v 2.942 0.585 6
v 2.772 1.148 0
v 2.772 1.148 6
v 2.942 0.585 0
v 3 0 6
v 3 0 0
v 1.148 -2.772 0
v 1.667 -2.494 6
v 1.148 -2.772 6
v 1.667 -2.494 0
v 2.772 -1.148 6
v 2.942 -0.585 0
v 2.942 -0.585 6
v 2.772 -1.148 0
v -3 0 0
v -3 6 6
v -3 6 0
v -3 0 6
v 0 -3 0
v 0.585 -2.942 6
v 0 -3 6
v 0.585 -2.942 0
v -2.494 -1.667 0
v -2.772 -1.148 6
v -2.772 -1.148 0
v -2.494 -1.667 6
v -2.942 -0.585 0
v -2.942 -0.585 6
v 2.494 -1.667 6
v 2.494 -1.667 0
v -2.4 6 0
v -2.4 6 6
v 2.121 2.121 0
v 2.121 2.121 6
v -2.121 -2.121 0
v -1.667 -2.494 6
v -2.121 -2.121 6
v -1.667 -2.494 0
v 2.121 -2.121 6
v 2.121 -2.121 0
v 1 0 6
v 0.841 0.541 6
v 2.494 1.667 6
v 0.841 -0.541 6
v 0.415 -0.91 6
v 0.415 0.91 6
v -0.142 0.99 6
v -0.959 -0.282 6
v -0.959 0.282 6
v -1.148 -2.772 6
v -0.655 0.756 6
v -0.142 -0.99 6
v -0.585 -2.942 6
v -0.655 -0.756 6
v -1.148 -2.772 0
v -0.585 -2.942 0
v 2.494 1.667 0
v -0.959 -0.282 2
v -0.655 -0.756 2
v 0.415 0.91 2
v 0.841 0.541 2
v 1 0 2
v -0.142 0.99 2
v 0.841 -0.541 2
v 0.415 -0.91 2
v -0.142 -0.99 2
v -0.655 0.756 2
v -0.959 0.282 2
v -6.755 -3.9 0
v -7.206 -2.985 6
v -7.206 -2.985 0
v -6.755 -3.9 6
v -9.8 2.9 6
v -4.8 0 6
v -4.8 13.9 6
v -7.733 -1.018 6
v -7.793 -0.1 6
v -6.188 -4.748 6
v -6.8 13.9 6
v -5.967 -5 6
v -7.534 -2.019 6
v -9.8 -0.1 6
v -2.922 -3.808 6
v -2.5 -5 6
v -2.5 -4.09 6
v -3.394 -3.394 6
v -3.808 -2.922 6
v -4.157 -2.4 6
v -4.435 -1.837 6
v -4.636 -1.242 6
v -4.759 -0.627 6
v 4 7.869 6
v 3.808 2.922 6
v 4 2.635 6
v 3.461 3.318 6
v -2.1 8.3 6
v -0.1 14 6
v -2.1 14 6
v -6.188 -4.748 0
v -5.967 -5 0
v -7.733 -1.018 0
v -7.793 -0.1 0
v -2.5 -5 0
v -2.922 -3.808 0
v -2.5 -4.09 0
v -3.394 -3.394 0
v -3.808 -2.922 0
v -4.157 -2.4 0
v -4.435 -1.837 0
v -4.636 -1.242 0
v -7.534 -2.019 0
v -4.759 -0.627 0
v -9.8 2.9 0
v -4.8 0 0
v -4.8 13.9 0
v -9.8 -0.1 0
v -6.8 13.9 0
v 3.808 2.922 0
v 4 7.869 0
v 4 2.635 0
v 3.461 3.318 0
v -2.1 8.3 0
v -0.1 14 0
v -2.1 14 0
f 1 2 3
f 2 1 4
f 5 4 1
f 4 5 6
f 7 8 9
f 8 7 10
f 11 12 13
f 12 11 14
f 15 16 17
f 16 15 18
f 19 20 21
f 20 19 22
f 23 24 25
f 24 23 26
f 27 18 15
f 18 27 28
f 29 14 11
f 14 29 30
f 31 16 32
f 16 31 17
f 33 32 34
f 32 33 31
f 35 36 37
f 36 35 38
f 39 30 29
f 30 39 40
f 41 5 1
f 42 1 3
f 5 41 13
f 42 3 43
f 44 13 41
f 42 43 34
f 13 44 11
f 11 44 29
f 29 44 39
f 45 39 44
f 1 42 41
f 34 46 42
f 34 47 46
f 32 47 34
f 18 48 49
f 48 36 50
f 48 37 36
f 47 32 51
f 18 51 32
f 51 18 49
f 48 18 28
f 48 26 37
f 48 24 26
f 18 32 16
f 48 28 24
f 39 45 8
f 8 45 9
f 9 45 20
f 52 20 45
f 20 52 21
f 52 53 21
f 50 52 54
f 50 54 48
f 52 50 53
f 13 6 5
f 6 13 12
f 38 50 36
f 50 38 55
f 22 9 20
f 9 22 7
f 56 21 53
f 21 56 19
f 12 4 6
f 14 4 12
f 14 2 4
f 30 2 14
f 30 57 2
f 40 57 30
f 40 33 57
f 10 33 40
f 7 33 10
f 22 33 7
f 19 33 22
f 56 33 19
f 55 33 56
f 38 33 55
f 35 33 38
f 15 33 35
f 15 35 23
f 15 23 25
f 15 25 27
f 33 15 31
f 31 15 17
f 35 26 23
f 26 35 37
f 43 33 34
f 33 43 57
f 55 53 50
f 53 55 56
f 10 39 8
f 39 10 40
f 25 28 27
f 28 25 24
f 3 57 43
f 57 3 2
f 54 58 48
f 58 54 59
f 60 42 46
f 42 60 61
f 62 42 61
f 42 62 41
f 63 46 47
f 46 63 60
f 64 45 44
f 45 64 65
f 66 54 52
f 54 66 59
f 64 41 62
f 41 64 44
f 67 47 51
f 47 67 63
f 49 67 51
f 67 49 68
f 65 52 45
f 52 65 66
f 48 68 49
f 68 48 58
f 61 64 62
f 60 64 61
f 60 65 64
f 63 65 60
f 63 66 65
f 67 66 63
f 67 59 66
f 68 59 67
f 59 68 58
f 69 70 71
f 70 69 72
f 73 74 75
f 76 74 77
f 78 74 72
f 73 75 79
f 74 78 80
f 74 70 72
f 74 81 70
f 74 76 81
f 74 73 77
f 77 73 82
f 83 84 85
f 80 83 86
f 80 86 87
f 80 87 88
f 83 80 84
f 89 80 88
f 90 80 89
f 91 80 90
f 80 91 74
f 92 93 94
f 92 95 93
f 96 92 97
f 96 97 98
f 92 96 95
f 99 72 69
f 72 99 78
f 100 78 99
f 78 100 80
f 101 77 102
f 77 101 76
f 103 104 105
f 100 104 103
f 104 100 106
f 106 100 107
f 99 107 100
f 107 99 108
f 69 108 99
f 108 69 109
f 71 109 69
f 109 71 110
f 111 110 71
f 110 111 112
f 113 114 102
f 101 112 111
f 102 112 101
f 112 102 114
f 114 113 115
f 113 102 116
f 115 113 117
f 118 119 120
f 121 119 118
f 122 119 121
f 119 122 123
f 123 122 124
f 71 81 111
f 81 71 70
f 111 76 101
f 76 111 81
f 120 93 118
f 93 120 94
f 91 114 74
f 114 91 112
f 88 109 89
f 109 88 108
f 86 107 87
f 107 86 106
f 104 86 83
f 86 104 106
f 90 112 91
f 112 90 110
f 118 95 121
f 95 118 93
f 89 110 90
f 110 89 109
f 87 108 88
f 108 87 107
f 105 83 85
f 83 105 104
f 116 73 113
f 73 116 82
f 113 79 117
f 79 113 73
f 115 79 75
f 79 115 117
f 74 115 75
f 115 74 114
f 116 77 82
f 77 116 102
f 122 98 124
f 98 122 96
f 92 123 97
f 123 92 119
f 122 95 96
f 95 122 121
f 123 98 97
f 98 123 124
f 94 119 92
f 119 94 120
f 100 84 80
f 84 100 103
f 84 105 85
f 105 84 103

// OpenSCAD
beltThick  = 1.5 + 0.3;  // thickness of belt from back to tooth tip
beltThick2 = 2.4 + 0.3;  // thickness of DOUBLED over belt, back to back, teeth interlocked

module beltCatch(height,full=false)
{
  postRad = 3;  // radius of main post
  difference() {
    hull() {
      cylinder(h=height,r=postRad,$fn=32);
      translate([-postRad,0,0]) cube([0.6,2.0*postRad,height]);
    }
    translate([0,0,height-4]) cylinder(h=5,r=1,$fn=11);  // pilot hole for optional lock-in screw
  }

  difference() {
    union() {
      difference() {
        cylinder(h=height,r=postRad+beltThick+3,$fn=48);
        translate([0,0,-1]) cylinder(h=height+2,r=postRad+beltThick,$fn=48);
        translate([-10,0,-1]) cube([10,20,height+2]);
        translate([-10*.7071,10*.7071,-1]) rotate([0,0,-45]) cube([10,20,height+2]);
      }
      translate([-postRad-beltThick-3,-.1,0]) hull() {
        translate([-2, 0,0]) cube([5,3,height]);
        translate([ 1,13,0]) cube([2,1,height]);
      }
      hull() {
        translate([-postRad-beltThick+beltThick2, 2.0*postRad+beltThick+.5,0]) cube([2,5.7,height]);
        rotate([0,0,43]) translate([postRad+beltThick,0,0]) cube([3,1,height]);
      }
    }

    // chop off (unnecessary) bottom curve part of catch
    translate([-12 ,-15,-1]) cube([24,15-postRad-beltThick-0.2,height+2]);
    translate([-2.5,-15,-1]) cube([ 5,15-postRad-0.2          ,height+2]);

    if (!full) {
      // chop off most of far brace for close quarters
      translate([postRad+1,-8,-1]) cube([10,20,height+2]);
      translate([-2,-7,-1]) rotate([0,0,-45]) cube([5,10,height+2]);
    }
  }
}

beltCatch(6);
%translate([0,-20,0]) mirror([0,1,0]) beltCatch(6,full=true);
